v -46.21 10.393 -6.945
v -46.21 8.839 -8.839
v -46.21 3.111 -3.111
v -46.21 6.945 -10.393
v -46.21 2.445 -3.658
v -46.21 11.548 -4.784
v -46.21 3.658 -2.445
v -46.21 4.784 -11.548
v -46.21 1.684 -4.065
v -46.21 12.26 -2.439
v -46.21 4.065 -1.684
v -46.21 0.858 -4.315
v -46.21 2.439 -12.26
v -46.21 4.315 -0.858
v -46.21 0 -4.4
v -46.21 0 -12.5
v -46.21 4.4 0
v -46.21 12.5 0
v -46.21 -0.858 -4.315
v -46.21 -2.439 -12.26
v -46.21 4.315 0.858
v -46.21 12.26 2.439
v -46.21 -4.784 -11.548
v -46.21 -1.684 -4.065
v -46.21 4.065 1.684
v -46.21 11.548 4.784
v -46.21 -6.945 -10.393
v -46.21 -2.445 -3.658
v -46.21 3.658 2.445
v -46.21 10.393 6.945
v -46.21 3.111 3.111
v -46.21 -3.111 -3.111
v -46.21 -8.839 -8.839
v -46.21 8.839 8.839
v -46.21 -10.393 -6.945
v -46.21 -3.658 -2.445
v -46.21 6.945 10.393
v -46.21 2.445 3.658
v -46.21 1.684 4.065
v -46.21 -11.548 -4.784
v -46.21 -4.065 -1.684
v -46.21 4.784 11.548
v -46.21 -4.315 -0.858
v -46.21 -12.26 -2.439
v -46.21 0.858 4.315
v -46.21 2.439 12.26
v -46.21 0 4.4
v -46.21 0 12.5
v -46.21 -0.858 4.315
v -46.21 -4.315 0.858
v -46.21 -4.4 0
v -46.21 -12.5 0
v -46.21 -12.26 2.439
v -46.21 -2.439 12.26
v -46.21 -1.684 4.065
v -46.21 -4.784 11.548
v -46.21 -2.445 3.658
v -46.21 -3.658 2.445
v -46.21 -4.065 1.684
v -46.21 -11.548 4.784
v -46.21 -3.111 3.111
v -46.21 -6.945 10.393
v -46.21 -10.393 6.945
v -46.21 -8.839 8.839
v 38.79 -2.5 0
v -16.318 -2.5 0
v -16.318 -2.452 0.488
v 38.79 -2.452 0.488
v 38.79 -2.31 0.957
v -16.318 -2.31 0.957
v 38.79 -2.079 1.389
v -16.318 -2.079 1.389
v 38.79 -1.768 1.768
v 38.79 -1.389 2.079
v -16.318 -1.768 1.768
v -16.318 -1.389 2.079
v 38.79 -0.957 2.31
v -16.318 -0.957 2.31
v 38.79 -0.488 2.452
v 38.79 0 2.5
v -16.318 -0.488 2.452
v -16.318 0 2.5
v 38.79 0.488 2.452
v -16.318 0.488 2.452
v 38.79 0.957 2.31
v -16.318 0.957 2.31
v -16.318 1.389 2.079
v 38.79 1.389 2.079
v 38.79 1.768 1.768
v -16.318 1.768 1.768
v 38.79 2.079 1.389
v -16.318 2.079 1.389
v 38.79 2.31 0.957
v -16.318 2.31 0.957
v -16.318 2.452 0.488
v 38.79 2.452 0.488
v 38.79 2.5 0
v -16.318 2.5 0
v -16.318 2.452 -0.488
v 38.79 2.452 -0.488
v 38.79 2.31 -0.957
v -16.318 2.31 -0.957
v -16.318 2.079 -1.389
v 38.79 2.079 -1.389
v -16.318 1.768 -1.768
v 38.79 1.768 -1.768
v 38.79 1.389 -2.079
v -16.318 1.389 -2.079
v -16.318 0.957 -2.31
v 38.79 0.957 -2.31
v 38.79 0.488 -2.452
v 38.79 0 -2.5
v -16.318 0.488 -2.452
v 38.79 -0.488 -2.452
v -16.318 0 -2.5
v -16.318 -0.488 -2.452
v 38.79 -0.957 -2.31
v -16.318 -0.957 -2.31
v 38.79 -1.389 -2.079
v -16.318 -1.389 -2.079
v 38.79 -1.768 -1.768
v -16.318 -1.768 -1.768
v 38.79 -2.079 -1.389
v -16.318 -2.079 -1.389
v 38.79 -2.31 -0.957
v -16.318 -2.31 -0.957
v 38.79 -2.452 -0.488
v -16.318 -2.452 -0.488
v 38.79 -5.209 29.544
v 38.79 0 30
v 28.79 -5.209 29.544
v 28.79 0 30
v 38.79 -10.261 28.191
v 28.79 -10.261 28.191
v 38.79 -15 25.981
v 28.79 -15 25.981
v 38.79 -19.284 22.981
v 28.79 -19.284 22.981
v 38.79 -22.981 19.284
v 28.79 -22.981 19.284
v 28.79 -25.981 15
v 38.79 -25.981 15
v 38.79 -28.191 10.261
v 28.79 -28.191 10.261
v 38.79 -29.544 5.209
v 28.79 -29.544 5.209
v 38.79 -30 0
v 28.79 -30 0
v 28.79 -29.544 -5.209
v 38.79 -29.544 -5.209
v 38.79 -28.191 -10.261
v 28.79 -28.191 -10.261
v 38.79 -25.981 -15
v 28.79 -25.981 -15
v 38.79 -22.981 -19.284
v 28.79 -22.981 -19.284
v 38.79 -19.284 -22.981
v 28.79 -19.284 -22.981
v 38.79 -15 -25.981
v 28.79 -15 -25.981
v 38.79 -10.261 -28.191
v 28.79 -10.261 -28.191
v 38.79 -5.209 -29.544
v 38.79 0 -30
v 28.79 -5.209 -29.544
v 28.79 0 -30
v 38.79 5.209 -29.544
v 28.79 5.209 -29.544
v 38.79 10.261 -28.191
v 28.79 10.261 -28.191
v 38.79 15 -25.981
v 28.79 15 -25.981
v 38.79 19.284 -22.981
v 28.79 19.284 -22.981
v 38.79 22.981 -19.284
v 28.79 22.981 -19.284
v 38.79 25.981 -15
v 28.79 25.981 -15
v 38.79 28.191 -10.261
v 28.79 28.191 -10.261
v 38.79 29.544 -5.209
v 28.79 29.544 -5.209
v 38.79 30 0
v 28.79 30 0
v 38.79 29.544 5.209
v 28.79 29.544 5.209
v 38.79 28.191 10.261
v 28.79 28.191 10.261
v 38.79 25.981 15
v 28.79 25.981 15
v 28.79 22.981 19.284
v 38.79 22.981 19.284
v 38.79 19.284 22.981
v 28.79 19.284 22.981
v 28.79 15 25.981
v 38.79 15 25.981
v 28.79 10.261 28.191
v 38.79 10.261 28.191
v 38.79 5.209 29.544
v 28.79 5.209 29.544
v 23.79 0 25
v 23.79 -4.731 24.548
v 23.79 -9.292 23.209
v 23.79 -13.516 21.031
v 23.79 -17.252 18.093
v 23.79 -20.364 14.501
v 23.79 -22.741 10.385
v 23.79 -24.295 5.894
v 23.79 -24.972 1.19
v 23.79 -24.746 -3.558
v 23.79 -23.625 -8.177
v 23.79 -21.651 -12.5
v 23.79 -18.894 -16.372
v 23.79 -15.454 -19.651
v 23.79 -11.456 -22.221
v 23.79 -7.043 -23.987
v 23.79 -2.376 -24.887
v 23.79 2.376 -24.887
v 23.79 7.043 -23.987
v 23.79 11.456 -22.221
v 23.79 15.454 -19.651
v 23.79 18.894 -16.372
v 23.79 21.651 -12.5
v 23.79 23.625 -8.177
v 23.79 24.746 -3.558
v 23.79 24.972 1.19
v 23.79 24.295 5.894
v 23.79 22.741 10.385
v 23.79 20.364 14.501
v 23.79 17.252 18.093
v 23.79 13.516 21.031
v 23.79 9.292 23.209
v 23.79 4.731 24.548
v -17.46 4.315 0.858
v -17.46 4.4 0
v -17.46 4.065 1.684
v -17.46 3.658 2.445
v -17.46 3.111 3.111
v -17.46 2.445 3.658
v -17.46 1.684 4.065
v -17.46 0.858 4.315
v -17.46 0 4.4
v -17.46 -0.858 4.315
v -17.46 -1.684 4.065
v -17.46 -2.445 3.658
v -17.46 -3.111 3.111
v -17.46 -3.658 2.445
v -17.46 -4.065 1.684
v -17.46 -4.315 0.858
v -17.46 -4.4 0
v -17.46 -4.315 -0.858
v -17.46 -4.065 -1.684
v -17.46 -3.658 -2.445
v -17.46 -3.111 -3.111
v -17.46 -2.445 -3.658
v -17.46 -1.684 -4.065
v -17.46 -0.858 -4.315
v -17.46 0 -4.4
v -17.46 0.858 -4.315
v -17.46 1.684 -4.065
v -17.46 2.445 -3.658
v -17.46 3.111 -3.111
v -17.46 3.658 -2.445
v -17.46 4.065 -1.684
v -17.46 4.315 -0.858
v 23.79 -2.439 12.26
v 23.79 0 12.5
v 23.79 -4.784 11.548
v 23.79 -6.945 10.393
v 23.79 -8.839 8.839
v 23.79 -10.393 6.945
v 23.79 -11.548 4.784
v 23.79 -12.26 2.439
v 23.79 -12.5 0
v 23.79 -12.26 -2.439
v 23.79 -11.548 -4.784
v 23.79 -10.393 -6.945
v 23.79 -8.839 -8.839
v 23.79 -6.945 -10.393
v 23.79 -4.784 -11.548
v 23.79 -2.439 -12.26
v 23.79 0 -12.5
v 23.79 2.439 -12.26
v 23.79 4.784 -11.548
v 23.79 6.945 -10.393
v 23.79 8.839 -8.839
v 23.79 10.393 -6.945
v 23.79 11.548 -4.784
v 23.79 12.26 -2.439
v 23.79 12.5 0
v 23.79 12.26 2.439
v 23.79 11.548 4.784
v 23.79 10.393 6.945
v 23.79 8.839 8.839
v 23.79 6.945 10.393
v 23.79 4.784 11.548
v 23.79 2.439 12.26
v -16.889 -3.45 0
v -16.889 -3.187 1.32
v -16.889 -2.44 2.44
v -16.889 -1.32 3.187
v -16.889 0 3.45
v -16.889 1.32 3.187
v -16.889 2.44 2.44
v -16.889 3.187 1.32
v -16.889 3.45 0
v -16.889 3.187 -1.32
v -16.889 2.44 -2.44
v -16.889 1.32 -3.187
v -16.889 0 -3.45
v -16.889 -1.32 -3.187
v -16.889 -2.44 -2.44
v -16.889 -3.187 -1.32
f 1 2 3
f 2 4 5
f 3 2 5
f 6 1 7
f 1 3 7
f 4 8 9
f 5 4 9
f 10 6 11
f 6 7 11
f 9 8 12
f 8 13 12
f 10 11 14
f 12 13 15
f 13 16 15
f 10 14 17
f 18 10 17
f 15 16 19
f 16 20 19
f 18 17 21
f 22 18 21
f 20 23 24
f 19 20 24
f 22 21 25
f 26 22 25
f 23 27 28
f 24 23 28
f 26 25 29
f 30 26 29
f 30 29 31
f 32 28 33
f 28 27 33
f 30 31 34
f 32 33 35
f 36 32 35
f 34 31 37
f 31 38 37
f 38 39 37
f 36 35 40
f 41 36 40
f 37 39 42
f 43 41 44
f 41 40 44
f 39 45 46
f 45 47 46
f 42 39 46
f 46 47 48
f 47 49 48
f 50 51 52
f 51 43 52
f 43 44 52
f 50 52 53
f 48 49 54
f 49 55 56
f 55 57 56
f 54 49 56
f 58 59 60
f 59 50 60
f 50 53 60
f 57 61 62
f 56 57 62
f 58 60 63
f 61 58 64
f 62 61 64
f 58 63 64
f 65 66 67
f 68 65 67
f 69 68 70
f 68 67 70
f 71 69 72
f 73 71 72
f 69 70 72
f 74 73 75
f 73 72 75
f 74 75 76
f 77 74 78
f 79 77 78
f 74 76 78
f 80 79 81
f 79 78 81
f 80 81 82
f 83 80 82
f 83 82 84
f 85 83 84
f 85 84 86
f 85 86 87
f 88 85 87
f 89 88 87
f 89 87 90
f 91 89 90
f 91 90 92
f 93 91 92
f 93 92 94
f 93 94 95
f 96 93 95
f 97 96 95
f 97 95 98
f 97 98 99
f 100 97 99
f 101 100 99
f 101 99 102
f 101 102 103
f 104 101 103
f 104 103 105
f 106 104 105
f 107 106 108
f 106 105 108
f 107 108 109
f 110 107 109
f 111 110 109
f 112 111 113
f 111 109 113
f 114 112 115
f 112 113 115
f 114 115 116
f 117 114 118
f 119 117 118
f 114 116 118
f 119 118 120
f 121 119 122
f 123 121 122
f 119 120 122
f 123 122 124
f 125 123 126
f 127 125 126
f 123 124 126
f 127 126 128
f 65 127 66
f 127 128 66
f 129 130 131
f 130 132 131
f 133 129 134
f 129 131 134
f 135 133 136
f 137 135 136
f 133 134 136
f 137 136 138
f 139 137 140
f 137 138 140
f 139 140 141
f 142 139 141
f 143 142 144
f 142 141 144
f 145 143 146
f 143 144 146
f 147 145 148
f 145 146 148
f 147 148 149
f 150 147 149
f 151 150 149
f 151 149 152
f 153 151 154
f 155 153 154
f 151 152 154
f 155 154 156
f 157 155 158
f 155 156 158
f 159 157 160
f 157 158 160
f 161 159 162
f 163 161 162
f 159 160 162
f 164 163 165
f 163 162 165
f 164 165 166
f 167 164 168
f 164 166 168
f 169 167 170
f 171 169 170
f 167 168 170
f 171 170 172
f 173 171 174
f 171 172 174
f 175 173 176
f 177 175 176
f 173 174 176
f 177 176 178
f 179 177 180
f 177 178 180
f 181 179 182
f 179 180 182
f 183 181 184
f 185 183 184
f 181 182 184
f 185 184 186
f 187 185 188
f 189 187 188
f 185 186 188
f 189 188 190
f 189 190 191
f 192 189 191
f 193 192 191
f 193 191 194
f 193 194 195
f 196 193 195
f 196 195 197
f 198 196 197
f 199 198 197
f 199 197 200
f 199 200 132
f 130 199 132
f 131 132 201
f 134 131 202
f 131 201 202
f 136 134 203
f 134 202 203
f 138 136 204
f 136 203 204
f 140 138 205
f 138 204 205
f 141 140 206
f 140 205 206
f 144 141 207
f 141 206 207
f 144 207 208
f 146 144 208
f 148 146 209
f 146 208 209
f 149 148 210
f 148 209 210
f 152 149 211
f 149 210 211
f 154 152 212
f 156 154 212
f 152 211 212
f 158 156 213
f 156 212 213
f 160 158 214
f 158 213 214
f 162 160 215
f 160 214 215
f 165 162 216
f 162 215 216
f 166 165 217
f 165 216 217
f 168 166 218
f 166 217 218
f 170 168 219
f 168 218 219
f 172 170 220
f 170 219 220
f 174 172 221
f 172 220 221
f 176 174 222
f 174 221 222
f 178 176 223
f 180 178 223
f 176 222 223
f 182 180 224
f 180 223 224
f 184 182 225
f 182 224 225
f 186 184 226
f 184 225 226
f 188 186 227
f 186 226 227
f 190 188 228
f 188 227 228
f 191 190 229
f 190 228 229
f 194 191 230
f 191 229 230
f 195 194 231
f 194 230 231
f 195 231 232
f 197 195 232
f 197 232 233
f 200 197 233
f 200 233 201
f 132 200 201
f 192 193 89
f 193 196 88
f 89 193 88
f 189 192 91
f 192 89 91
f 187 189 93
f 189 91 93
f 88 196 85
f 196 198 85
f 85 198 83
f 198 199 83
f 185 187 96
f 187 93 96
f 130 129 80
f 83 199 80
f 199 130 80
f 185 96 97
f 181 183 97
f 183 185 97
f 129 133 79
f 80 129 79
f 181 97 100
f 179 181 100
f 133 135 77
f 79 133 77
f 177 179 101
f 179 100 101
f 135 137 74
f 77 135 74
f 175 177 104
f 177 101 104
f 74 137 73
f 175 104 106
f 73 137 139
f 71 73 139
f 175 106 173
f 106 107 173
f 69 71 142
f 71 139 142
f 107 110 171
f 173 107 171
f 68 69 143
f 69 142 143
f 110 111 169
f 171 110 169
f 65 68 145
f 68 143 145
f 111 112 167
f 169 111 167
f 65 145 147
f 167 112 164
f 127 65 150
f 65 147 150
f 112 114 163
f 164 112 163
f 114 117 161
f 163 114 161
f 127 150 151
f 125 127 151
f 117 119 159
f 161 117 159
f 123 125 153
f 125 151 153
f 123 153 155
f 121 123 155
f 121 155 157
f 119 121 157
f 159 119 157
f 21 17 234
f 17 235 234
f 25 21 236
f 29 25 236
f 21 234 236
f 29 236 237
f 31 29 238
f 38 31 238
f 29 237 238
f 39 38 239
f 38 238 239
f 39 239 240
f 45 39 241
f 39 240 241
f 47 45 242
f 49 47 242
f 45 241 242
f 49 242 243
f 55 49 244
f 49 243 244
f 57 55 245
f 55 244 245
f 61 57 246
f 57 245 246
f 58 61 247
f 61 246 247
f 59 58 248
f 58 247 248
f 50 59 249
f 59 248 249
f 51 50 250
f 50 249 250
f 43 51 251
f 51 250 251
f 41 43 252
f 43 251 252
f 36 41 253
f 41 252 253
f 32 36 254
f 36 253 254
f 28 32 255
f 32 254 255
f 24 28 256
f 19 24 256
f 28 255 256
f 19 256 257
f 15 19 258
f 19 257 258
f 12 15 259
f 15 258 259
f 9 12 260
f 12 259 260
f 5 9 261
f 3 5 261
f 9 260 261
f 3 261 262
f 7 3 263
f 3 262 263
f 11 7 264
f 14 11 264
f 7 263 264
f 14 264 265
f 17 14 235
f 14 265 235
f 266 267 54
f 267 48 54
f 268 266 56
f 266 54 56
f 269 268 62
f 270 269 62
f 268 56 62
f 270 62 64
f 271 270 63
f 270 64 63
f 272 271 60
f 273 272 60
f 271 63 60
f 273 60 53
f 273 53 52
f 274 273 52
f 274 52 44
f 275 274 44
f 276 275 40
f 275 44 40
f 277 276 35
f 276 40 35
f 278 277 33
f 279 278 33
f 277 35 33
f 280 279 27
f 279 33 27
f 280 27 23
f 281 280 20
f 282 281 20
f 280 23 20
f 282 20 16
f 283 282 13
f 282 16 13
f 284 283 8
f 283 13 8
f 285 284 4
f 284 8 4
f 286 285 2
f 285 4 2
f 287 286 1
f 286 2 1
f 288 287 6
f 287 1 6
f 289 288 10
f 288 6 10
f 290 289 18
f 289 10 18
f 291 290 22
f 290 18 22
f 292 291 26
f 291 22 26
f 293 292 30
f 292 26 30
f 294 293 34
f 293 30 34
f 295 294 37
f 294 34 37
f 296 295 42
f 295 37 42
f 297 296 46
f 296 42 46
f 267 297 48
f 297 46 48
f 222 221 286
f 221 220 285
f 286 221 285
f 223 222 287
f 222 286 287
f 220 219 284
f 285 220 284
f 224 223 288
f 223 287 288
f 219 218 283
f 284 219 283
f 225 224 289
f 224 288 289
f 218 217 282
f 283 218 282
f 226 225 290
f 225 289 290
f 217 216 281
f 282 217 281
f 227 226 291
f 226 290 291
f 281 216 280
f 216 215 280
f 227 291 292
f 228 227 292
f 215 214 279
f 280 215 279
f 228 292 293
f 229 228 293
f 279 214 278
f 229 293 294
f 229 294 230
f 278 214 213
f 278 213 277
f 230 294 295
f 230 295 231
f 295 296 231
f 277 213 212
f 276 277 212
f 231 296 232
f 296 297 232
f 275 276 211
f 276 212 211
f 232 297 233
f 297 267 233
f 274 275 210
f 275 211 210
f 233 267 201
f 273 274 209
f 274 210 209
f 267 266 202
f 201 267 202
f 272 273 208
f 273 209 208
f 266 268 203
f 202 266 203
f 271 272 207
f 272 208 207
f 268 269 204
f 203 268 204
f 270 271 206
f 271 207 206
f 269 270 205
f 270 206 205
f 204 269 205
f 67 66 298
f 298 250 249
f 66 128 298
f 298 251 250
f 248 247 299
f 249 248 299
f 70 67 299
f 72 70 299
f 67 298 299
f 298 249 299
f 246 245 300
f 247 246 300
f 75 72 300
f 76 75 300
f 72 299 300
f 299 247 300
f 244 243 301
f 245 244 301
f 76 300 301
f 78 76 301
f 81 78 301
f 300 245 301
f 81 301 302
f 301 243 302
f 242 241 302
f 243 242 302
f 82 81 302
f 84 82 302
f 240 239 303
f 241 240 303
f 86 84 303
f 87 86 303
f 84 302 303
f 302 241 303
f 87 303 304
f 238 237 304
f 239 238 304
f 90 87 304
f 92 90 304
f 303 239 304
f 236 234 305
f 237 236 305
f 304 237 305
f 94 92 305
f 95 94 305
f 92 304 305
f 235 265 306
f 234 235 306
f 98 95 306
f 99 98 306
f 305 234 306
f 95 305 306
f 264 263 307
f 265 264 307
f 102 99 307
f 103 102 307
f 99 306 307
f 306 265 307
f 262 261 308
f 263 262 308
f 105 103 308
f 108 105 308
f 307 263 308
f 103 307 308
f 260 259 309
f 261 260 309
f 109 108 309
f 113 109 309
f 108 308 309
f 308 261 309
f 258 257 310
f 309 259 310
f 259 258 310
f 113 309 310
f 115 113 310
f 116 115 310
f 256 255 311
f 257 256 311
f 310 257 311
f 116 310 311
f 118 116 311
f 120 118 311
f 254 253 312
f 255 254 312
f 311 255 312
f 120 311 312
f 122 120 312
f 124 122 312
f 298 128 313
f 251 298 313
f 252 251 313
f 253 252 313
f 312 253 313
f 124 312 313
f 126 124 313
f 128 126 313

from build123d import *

# Parameters (mm, degrees)
F3_D     = 8.8
F3_DEPTH = 28.75
F3_TIP   = 2.6437867237
F5_D     = 5


# Not quite as in the source:
# - a feature names something its author has since deleted; it is built from what else it names


with BuildPart() as f1:
    # F0 (on Front) → F1 (revolve)
    with BuildSketch(Plane.XZ):
        Polygon((23.7903209624, 12.5), (-46.2096790376, 12.5), (-46.2096790376, 0), (38.7903209624, 0), (38.7903209624, 30), (28.7903209624, 30), (23.7903209624, 25), align=None)
    revolve(axis=Axis((-0.8820928633, 0, 0), (1, 0, 0)))

    # F3
    with Locations(Plane(origin=(-46.2096790376, 0, 0), x_dir=(0, -1, 0), z_dir=(-1, 0, 0))):
        with Locations((0, 0)):
            Hole(F3_D / 2, depth=F3_DEPTH)
            with Locations((0, 0, -(F3_DEPTH + F3_TIP / 2))):  # 118° drill point
                Cone(0, F3_D / 2, F3_TIP, mode=Mode.SUBTRACT)

    # F5 (through all)
    with Locations(Plane.YZ.offset(38.7903209624)):
        with Locations((0, 0)):
            Hole(F5_D / 2)


solid = f1.part
